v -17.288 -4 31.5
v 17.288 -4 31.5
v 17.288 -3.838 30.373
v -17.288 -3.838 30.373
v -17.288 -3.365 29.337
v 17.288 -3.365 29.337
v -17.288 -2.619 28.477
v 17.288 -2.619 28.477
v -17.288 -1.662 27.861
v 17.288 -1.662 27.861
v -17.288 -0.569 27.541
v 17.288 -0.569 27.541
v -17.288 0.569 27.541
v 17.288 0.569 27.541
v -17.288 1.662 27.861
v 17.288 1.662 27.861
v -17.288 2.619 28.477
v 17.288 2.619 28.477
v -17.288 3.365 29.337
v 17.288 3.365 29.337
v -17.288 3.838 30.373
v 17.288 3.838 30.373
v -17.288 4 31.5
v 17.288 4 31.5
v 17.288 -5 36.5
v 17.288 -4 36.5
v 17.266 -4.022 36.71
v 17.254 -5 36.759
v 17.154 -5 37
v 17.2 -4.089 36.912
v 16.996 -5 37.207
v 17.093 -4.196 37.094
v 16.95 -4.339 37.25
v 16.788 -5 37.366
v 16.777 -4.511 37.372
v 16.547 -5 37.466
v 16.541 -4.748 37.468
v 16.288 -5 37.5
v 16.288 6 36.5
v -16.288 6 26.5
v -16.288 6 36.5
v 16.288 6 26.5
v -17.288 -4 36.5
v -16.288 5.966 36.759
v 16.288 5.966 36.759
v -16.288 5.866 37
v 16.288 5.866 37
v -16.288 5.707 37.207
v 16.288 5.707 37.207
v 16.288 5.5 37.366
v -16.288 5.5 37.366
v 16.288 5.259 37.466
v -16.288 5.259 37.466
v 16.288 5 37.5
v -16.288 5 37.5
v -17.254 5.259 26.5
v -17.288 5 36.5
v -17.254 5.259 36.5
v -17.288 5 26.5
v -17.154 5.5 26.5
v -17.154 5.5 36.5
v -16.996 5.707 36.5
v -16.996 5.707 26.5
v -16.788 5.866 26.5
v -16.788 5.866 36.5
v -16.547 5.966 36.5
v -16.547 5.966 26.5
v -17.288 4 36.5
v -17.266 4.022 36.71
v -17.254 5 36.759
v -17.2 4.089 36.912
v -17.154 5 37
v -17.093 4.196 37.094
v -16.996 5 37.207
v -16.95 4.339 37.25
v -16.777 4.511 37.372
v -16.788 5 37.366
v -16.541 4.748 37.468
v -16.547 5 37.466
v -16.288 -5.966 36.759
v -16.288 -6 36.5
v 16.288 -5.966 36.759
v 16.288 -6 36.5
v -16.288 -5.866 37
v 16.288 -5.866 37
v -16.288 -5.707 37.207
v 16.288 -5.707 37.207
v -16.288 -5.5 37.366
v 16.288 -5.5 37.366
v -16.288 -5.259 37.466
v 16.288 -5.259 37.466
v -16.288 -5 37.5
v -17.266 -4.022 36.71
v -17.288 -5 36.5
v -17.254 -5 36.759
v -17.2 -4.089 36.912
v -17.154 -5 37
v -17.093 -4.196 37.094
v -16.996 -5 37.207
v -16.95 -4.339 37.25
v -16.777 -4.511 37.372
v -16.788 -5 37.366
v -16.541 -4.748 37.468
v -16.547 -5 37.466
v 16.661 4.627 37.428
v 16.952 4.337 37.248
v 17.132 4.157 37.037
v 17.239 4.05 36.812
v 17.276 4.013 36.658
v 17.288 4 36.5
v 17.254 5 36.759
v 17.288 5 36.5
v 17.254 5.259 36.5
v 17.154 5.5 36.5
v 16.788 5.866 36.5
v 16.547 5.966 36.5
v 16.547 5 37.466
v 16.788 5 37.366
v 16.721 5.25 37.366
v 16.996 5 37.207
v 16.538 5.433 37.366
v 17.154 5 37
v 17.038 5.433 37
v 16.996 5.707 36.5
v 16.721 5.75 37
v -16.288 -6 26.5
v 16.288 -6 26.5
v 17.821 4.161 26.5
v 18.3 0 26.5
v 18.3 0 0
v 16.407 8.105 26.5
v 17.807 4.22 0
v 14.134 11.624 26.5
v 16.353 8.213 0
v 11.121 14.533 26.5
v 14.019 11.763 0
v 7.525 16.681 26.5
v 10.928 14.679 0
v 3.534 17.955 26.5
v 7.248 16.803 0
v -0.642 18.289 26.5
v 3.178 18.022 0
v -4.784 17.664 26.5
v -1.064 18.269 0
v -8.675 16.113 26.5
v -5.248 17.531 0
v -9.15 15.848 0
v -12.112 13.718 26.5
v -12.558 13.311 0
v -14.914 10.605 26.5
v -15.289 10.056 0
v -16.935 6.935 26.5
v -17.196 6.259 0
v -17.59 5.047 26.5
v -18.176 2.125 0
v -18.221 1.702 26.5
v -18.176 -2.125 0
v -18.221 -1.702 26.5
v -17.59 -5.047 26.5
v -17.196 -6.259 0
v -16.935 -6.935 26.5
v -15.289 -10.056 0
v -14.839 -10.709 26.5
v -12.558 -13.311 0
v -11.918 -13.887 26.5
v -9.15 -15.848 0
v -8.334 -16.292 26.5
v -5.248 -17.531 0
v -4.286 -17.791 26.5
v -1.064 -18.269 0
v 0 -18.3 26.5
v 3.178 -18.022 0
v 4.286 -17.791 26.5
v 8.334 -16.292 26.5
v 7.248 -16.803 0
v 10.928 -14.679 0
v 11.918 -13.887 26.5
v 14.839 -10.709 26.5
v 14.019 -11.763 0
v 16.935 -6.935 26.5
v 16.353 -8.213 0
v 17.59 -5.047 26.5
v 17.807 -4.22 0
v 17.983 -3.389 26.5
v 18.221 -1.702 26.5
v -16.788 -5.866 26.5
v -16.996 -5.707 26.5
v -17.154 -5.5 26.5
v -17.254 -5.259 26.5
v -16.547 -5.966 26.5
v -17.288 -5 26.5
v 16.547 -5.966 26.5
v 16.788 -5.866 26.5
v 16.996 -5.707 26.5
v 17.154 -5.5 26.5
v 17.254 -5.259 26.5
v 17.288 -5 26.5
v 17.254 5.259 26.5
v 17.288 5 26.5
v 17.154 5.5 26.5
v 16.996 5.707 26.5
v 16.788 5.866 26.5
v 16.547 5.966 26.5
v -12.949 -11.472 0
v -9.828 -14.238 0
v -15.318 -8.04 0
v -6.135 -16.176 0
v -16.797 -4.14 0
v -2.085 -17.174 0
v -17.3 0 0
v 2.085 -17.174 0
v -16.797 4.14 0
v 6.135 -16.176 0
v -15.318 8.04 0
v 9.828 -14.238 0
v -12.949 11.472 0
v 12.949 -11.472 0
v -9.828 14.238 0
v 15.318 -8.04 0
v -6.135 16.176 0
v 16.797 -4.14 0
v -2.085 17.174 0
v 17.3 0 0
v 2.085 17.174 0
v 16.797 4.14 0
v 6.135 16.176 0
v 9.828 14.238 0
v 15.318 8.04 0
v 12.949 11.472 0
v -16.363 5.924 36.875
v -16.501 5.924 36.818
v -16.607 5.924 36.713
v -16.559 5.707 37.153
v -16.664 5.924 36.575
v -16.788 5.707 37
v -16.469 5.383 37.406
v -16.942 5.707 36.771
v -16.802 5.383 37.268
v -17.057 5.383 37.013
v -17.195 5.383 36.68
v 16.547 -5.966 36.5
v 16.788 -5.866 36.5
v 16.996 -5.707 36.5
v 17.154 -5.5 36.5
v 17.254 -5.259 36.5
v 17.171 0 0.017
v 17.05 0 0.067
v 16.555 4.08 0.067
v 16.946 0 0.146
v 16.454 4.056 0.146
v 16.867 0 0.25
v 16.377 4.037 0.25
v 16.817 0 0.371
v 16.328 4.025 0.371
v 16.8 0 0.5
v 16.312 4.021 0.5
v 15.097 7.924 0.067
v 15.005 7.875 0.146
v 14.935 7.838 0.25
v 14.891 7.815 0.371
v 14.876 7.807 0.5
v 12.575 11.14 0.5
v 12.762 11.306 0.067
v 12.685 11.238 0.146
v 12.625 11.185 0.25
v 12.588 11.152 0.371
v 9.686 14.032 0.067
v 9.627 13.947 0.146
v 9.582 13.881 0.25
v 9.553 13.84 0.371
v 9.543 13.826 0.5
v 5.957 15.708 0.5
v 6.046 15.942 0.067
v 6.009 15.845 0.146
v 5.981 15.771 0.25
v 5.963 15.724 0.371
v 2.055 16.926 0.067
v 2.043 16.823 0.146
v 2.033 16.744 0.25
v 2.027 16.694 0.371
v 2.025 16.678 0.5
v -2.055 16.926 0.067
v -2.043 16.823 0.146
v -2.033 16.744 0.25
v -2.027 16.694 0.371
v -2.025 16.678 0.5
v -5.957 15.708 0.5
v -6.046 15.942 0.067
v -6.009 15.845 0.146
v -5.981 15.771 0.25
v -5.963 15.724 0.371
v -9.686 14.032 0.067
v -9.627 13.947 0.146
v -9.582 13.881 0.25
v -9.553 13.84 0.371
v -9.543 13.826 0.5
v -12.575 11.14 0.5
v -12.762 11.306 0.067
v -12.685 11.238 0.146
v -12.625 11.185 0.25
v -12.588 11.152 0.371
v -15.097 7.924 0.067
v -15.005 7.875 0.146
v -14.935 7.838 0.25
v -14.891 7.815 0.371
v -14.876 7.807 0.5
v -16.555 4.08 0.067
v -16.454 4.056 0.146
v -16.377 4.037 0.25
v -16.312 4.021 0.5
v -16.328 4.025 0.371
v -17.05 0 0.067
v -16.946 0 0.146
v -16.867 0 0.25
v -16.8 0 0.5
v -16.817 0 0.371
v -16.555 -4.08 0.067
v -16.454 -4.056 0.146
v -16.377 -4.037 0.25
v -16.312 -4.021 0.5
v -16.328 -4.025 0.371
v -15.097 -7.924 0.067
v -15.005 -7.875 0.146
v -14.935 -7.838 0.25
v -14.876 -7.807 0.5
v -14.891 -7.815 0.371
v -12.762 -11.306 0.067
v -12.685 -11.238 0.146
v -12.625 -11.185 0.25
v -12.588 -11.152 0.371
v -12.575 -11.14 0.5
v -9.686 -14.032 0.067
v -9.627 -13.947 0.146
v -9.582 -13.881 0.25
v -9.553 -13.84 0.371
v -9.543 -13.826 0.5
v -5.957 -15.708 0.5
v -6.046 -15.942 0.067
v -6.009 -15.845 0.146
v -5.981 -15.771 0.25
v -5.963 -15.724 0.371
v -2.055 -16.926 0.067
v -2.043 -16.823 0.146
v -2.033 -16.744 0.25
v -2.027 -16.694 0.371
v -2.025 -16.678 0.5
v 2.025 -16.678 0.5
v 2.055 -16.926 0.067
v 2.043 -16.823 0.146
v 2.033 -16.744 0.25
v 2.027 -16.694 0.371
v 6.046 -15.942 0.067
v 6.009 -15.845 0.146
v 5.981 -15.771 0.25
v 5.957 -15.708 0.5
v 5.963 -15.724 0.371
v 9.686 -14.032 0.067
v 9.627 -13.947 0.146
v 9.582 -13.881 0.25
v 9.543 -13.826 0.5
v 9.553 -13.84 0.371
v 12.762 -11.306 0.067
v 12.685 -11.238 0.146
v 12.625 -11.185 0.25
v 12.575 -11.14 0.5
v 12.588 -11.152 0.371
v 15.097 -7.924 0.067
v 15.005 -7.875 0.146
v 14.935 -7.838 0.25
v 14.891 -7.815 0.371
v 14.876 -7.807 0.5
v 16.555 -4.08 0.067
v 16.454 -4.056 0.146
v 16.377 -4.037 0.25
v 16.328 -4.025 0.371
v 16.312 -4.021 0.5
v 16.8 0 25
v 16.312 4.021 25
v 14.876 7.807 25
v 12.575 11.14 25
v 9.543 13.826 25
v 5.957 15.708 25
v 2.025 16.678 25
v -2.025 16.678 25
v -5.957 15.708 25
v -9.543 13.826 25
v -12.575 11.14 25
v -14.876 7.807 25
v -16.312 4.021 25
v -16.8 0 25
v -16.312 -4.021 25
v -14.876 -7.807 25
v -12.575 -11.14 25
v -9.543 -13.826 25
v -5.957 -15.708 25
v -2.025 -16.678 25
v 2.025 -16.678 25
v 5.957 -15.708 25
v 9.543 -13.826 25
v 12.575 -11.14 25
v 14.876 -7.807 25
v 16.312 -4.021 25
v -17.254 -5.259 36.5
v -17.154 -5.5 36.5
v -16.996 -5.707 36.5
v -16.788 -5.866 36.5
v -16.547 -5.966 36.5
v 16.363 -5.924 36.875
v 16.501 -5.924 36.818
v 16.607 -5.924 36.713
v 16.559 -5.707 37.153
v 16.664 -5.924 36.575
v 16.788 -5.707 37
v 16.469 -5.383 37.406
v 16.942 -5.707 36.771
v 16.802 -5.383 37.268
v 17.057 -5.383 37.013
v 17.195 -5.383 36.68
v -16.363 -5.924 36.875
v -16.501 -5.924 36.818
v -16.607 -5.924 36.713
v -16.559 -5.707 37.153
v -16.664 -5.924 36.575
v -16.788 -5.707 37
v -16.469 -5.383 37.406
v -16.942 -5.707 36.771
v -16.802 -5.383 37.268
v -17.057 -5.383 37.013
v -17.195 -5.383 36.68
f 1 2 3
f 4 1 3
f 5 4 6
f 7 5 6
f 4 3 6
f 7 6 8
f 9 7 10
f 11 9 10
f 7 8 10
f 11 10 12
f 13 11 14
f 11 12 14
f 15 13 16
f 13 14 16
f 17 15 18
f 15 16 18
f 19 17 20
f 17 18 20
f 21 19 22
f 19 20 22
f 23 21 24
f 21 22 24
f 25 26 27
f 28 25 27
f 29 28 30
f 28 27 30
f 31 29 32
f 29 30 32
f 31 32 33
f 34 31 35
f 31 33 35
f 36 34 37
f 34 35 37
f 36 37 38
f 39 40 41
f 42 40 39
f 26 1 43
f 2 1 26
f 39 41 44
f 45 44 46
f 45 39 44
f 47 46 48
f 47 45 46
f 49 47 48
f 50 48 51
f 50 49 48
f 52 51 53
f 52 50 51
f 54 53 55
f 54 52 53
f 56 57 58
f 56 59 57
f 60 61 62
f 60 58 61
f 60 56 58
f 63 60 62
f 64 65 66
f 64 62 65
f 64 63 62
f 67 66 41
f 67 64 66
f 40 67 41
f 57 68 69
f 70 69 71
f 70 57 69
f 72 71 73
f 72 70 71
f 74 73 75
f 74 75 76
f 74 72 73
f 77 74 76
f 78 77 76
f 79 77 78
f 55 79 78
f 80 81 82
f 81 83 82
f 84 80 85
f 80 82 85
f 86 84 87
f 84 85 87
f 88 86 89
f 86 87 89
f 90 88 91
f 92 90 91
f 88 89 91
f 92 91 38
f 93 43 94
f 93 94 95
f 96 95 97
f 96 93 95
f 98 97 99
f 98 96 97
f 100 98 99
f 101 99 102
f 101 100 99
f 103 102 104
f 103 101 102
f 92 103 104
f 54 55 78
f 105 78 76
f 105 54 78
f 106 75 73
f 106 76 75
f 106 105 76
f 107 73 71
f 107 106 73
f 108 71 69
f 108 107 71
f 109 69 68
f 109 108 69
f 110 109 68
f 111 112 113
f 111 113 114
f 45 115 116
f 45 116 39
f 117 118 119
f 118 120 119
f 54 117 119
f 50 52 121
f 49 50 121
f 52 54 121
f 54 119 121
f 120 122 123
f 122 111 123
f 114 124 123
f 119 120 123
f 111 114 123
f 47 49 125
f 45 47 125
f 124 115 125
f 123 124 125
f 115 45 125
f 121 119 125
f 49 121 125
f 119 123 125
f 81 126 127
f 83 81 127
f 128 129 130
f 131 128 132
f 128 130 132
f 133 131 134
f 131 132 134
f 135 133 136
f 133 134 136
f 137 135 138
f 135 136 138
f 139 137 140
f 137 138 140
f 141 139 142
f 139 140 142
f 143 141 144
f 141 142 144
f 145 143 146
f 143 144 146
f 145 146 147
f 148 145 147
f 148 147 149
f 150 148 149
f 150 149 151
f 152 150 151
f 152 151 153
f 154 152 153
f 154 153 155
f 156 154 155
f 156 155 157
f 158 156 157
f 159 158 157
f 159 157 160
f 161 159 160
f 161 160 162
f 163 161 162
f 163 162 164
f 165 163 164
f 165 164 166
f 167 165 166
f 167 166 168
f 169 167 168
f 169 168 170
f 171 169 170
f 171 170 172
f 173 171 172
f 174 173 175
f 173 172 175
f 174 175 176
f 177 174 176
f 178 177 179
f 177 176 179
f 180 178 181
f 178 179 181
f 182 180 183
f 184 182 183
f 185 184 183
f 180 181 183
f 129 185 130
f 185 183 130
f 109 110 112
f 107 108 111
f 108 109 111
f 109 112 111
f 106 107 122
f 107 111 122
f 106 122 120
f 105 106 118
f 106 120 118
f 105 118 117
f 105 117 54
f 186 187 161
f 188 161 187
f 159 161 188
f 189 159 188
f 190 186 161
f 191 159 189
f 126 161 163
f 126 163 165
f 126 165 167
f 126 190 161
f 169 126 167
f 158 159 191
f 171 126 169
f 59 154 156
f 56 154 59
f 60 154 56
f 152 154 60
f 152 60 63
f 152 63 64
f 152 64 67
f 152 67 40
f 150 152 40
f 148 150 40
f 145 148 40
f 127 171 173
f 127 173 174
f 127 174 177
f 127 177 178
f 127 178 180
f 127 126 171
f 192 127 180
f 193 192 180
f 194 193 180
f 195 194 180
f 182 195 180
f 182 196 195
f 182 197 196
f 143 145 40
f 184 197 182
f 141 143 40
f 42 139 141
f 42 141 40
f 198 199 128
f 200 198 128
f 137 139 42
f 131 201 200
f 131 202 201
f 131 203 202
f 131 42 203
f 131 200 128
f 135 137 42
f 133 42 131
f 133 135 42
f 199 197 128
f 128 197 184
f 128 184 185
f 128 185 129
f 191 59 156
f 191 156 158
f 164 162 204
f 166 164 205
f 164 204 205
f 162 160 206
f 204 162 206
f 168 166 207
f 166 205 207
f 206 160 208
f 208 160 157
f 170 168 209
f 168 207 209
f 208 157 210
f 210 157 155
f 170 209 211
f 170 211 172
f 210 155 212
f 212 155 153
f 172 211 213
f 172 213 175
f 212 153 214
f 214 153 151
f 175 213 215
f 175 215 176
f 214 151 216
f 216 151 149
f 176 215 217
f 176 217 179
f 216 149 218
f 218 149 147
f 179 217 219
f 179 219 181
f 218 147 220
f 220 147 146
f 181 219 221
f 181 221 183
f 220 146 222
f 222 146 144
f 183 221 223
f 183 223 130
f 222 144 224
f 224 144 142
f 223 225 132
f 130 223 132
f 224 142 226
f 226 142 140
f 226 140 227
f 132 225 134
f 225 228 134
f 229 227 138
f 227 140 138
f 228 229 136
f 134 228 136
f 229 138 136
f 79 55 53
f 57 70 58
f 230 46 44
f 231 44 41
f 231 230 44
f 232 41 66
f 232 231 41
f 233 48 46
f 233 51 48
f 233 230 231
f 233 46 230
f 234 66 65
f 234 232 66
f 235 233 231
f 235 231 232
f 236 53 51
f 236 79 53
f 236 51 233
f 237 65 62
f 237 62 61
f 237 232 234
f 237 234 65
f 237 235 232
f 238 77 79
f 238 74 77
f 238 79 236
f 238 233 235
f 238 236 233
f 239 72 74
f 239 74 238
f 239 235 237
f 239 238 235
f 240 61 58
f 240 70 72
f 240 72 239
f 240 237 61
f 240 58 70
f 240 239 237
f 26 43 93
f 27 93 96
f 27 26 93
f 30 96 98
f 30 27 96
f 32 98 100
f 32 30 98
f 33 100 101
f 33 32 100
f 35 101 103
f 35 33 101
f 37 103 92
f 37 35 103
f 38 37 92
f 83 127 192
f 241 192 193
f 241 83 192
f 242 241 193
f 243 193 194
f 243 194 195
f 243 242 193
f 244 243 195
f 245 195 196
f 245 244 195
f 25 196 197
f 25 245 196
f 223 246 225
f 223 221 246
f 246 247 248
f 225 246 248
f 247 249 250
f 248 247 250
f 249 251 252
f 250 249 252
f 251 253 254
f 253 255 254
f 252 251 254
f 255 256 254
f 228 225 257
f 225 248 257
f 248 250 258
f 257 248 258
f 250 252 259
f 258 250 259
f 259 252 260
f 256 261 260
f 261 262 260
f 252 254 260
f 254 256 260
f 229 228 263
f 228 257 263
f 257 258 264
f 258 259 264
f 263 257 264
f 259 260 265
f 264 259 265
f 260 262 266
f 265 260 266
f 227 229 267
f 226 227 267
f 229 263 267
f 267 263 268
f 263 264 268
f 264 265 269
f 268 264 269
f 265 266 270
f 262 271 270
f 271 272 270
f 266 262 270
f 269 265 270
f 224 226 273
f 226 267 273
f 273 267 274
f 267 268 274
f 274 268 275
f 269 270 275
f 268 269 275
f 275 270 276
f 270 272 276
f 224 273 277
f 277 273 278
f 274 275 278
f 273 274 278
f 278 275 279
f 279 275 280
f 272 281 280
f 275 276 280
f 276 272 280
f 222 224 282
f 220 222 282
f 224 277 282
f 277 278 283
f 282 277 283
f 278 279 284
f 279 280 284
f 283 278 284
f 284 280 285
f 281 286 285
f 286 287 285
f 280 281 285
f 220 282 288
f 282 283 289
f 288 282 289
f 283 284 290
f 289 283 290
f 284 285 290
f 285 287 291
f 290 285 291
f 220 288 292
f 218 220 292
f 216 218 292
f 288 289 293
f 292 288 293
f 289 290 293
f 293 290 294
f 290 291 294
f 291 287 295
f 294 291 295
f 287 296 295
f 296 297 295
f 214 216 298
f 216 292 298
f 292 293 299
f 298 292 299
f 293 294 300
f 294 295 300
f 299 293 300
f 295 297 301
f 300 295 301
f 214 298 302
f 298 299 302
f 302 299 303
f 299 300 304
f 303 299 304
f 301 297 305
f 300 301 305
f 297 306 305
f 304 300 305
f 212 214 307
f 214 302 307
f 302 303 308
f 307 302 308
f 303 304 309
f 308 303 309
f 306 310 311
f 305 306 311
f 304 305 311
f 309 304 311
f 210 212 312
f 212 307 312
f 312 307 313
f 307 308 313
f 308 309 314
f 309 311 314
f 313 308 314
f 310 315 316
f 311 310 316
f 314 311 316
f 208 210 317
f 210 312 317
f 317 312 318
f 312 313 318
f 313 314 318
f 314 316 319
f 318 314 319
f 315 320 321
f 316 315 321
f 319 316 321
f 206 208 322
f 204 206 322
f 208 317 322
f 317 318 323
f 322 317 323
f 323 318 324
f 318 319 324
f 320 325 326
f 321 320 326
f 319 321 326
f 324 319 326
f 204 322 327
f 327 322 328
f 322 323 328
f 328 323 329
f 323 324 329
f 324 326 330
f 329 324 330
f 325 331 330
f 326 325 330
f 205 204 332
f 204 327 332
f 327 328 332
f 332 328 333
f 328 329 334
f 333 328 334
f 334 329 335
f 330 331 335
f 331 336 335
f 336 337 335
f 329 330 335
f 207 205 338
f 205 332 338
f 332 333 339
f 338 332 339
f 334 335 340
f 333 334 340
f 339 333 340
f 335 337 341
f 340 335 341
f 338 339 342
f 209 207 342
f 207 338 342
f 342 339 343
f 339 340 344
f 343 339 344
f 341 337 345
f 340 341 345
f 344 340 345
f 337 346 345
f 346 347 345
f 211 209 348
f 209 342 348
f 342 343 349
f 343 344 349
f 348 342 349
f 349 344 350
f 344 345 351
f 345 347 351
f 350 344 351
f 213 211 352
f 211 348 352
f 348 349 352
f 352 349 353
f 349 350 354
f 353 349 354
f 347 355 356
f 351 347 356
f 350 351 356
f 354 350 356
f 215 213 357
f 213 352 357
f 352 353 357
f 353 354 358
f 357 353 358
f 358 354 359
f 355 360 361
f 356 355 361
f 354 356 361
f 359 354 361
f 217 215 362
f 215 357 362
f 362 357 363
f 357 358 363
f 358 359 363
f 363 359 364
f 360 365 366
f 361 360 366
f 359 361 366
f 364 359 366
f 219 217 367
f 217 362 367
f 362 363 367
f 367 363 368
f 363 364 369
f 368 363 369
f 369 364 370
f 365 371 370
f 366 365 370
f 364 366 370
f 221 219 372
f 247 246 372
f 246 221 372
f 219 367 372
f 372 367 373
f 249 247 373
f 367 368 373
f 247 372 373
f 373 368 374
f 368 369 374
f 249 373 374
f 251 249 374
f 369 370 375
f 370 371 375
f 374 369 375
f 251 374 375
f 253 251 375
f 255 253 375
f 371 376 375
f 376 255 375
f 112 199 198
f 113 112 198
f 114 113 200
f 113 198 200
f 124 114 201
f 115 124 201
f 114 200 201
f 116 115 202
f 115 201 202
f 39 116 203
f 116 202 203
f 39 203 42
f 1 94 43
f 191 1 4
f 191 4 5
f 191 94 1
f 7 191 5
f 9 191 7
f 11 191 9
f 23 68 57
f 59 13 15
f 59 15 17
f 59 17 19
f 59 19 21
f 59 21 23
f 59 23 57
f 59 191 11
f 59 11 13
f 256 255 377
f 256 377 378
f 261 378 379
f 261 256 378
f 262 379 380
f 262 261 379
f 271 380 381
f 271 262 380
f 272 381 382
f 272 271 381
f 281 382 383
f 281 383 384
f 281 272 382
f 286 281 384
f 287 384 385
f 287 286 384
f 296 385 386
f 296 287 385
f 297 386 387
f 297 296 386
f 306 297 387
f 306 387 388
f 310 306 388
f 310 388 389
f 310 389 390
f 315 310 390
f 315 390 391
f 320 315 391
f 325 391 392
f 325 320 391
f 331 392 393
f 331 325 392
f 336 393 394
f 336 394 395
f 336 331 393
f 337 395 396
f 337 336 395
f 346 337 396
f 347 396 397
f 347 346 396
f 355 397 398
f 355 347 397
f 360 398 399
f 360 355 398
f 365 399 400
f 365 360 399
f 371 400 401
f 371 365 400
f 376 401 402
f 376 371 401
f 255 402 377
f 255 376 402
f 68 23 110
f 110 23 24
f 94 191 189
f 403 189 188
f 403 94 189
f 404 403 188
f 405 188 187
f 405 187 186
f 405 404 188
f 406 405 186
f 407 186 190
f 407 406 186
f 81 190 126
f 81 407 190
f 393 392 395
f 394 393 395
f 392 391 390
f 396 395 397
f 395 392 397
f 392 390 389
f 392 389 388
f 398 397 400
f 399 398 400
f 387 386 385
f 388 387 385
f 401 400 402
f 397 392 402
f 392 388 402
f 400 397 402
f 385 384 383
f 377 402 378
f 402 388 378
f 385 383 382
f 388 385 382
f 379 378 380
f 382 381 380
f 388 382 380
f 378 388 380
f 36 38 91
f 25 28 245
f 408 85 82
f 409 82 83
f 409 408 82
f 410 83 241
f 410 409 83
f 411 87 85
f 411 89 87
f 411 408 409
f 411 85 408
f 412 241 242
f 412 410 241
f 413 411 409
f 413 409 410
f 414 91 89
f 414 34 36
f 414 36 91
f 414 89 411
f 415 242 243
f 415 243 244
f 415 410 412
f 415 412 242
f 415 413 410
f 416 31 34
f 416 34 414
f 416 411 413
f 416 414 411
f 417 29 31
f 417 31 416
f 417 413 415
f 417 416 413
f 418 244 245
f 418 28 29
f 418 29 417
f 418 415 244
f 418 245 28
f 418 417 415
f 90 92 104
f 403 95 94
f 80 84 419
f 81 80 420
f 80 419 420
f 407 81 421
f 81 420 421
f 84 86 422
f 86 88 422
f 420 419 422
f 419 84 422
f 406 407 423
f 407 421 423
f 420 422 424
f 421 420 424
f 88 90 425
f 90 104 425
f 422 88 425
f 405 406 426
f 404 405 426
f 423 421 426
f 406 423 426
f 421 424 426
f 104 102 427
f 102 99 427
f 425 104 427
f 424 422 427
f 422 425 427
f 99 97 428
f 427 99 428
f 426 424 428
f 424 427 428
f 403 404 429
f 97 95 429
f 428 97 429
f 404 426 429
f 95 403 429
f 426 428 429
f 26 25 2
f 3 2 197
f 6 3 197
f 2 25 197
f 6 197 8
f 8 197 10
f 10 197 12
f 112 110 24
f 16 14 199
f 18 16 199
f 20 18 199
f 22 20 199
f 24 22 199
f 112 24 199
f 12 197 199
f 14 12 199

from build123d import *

# Parameters (mm, degrees)
F0_R         = 18.3
F0_R_2       = 16.8
F1_DEPTH     = 25
F2_R         = 18.3
F2_R_2       = 16.8
F3_DEPTH     = 1.5
F4_W         = 34.5768708821
F4_H         = 12
F5_DEPTH     = 5
F7_DEPTH     = 36
F8_W         = 34.5768708821
F8_H         = 2
F7_FACE_W    = 34.5768708821
F7_FACE_H    = 2
F9_DEPTH     = 6
F10_R        = 0.99999
F11_T1_DEPTH = 11
F11_T4_ANGLE = 90
F12_R        = 0.5


# Not quite as in the source:
# - a fillet or chamfer that OpenCascade refuses, or shapes differently, is made with other operations: its cross-section is extruded or revolved along the edge and cut away or added
# - a fillet or chamfer is up to 0.001 mm smaller than in the source, because OpenCascade refuses the exact size


with BuildPart() as f1:
    # F0 (on Top) → F1 (new body)
    with BuildSketch(Plane.XY):
        Circle(F0_R)
        Circle(F0_R_2, mode=Mode.SUBTRACT)
    extrude(amount=F1_DEPTH)

    # F2 (on face) → F3 (join)
    with BuildSketch(Plane.XY.offset(25)):
        Circle(F2_R)
        Circle(F2_R_2, mode=Mode.SUBTRACT)
        Circle(F2_R_2)
    extrude(amount=F3_DEPTH)

    # F4 (on face) → F5 (join)
    with BuildSketch(Plane.XY.offset(26.5)):
        Rectangle(F4_W, F4_H)
    extrude(amount=F5_DEPTH)

    # F6 (on face) → F7 (cut)
    with BuildSketch(Plane.YZ.offset(17.2884354411)):
        with BuildLine():
            ThreePointArc((-4, 31.5), (0, 27.5), (4, 31.5))
            Line((4, 31.5), (-4, 31.5))
        make_face()
    extrude(amount=-F7_DEPTH, mode=Mode.SUBTRACT)

    # F8 (on face) + F7_face (on face) → F9 (join)
    with BuildSketch(Plane.XY.offset(31.5)):
        with Locations((0, -5)):
            Rectangle(F8_W, F8_H)
    with BuildSketch(Plane(origin=(0, -5, 31.5), x_dir=(1, 0, 0), z_dir=(0, 0, 1))):
        with Locations((0, 10)):
            Rectangle(F7_FACE_W, F7_FACE_H)
    extrude(amount=F9_DEPTH)

    # F10 (radius 1 in the source; OpenCascade refuses exactly that, so slightly less here)
    f10_edges = [f1.edges().sort_by_distance(p)[0] for p in [
        (17.288435, -5, 37.5),
        (0, -4, 37.5),
        (-17.288435, -5, 37.5),
        (0, -6, 37.5),
        (-17.288435, 5, 37.5),
        (0, 4, 37.5),
        (17.288435, 5, 37.5),
        (0, 6, 37.5),
        (17.288435, -6, 32),
        (-17.288435, -6, 32),
        (-17.288435, 6, 32),
    ]]
    fillet(f10_edges, radius=F10_R)

    # F11: fillet of radius 1 on 1 edges, made by hand

    # F11_s2 → F11_t1 (cut)
    with BuildSketch(Plane.XY.offset(26.5)):
        with BuildLine():
            ThreePointArc((17.2884354411, 5), (16.9955422223, 5.7071067812), (16.2884354411, 6))
            Line((16.2884354411, 6), (17.2884354411, 6))
            Line((17.2884354411, 6), (17.2884354411, 5))
        make_face()
    extrude(amount=F11_T1_DEPTH, mode=Mode.SUBTRACT)

    # F11_s3 → F11_t4 (revolve, cut)
    with BuildSketch(Plane.XZ.offset(-5)):
        with BuildLine():
            ThreePointArc((16.2884454411, 37.5), (16.9955451512, 37.2071097101), (17.2884354411, 36.50001))
            Line((17.2884354411, 36.50001), (17.2884354411, 37.5))
            Line((17.2884354411, 37.5), (16.2884454411, 37.5))
        make_face()
    revolve(axis=Axis((16.2884354411, 5, 37.5), (0, 0, 1)), revolution_arc=F11_T4_ANGLE, mode=Mode.SUBTRACT)

    # F12
    f12_edges = [f1.edges().sort_by_distance(p)[0] for p in [
        (-16.8, 0, 0),
    ]]
    fillet(f12_edges, radius=F12_R)


solid = f1.part
